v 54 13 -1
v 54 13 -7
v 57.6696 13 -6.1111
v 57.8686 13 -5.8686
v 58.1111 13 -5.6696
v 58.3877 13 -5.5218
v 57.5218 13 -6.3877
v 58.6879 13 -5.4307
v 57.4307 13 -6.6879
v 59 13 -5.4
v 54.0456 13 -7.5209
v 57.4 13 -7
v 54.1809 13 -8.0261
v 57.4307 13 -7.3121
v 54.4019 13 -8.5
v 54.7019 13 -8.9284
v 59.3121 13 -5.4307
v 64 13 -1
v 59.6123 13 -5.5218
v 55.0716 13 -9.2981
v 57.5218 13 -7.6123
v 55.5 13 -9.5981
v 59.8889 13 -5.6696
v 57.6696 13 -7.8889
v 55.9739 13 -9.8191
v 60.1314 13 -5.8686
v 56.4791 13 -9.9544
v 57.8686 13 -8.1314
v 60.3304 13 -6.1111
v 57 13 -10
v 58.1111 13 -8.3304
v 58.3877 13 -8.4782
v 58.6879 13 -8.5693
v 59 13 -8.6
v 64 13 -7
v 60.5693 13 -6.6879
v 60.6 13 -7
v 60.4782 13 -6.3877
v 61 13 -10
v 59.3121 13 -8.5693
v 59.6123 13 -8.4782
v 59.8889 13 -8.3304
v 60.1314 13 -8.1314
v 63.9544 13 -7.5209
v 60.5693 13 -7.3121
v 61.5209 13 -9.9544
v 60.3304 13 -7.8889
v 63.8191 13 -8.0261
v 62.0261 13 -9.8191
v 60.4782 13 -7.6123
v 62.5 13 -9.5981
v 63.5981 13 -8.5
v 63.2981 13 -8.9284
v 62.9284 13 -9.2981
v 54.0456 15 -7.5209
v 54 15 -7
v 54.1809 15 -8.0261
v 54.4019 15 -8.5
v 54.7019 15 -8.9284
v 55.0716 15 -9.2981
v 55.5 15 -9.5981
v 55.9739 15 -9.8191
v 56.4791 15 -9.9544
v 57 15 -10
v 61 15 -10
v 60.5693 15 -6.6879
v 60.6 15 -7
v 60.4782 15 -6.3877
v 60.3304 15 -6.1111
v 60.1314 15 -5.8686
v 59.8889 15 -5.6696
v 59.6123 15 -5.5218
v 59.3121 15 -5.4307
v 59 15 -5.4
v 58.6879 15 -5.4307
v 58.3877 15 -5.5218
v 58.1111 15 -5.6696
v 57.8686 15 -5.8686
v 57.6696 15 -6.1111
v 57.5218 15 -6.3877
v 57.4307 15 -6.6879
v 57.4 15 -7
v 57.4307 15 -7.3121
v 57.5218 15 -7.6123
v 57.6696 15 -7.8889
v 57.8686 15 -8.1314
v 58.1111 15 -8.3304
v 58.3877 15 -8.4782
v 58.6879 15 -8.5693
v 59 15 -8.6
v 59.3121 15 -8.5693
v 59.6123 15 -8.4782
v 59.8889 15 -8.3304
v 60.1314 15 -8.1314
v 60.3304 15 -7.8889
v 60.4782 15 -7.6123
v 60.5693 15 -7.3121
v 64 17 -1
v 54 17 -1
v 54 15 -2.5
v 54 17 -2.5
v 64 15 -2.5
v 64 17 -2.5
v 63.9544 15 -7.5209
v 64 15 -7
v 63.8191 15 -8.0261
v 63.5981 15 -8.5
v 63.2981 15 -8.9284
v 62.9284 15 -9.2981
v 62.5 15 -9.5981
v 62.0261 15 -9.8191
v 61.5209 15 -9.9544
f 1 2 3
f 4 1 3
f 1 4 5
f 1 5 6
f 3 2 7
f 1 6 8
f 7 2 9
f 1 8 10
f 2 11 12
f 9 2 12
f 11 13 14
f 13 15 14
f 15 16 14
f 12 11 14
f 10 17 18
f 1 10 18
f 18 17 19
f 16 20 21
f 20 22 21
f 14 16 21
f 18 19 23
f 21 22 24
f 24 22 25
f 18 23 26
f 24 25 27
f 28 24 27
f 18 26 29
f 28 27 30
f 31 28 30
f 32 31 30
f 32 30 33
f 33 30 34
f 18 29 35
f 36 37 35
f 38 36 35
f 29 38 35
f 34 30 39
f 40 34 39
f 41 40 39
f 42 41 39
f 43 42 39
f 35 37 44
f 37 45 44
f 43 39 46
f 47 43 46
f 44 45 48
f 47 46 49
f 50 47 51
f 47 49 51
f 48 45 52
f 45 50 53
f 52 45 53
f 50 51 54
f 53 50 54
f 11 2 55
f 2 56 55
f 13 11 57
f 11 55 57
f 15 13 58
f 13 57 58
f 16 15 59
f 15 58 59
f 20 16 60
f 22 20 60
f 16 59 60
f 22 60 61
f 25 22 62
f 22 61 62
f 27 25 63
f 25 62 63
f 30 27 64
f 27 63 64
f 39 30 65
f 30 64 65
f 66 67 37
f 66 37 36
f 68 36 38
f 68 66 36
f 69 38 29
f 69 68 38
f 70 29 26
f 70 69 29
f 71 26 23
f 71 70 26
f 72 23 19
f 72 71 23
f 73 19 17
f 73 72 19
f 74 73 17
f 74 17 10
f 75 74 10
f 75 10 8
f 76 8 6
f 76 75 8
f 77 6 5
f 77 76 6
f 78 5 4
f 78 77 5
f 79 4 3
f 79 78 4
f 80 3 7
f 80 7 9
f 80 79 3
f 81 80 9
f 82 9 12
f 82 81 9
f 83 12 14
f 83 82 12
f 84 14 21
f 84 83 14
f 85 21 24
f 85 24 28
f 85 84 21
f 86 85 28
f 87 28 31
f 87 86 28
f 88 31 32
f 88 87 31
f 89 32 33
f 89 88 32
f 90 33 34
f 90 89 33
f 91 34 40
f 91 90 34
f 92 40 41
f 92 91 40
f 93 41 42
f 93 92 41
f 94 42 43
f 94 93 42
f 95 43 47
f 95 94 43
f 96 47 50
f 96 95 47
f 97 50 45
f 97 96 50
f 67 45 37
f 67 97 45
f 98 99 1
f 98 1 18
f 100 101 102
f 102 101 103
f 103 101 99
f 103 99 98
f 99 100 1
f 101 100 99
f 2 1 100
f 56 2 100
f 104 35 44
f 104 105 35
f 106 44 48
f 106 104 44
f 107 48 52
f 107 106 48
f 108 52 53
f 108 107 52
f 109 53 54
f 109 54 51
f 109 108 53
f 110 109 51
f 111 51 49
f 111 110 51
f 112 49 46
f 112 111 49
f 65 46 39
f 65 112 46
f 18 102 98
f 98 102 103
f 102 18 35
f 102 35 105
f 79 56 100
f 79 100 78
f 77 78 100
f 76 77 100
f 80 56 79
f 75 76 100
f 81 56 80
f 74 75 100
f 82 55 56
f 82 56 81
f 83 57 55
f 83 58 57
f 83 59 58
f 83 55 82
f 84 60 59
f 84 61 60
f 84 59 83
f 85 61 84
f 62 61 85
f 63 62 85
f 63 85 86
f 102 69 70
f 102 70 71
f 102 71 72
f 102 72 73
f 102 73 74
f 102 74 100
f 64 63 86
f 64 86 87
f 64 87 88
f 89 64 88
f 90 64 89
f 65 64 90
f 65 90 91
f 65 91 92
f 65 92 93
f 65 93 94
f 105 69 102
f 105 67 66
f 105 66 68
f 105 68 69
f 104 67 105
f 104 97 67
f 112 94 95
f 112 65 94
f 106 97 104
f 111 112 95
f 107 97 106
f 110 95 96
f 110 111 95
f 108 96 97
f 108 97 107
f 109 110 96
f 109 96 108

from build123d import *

# Parameters (mm, degrees)
BOX193_W          = 10
BOX193_H          = 2
BOX193_DEPTH      = 1.5
CYLINDER075_R     = 1.6
CYLINDER075_DEPTH = 2
BOX191_W          = 10
BOX191_H          = 2
BOX191_DEPTH      = 9
FILLET044_R       = 3


with BuildPart() as cube182:
    # Box193 → Box193 (new body)
    with BuildSketch(Plane(origin=(54, 15, -2.5), x_dir=(1, 0, 0), z_dir=(0, 0, 1))):
        with Locations((5, 1)):
            Rectangle(BOX193_W, BOX193_H)
    extrude(amount=BOX193_DEPTH)


with BuildPart() as cylinder156:
    # Cylinder075 → Cylinder075 (new body)
    with BuildSketch(Plane(origin=(59, 15, -7), x_dir=(1, 0, 0), z_dir=(0, -1, 0))):
        Circle(CYLINDER075_R)
    extrude(amount=CYLINDER075_DEPTH)


with BuildPart() as fusion060:
    # Box191 → Box191 (new body)
    with BuildSketch(Plane(origin=(54, 13, -10), x_dir=(1, 0, 0), z_dir=(0, 0, 1))):
        with Locations((5, 1)):
            Rectangle(BOX191_W, BOX191_H)
    extrude(amount=BOX191_DEPTH)

    # Fillet044
    fillet044_edges = [fusion060.edges().sort_by_distance(p)[0] for p in [
        (54, 14, -10),
        (64, 14, -10),
    ]]
    fillet(fillet044_edges, radius=FILLET044_R)

    # Cut099: cut Cylinder156
    add(cylinder156.part, mode=Mode.SUBTRACT)

    # Fusion060: union Cube182
    add(cube182.part)


solid = fusion060.part
